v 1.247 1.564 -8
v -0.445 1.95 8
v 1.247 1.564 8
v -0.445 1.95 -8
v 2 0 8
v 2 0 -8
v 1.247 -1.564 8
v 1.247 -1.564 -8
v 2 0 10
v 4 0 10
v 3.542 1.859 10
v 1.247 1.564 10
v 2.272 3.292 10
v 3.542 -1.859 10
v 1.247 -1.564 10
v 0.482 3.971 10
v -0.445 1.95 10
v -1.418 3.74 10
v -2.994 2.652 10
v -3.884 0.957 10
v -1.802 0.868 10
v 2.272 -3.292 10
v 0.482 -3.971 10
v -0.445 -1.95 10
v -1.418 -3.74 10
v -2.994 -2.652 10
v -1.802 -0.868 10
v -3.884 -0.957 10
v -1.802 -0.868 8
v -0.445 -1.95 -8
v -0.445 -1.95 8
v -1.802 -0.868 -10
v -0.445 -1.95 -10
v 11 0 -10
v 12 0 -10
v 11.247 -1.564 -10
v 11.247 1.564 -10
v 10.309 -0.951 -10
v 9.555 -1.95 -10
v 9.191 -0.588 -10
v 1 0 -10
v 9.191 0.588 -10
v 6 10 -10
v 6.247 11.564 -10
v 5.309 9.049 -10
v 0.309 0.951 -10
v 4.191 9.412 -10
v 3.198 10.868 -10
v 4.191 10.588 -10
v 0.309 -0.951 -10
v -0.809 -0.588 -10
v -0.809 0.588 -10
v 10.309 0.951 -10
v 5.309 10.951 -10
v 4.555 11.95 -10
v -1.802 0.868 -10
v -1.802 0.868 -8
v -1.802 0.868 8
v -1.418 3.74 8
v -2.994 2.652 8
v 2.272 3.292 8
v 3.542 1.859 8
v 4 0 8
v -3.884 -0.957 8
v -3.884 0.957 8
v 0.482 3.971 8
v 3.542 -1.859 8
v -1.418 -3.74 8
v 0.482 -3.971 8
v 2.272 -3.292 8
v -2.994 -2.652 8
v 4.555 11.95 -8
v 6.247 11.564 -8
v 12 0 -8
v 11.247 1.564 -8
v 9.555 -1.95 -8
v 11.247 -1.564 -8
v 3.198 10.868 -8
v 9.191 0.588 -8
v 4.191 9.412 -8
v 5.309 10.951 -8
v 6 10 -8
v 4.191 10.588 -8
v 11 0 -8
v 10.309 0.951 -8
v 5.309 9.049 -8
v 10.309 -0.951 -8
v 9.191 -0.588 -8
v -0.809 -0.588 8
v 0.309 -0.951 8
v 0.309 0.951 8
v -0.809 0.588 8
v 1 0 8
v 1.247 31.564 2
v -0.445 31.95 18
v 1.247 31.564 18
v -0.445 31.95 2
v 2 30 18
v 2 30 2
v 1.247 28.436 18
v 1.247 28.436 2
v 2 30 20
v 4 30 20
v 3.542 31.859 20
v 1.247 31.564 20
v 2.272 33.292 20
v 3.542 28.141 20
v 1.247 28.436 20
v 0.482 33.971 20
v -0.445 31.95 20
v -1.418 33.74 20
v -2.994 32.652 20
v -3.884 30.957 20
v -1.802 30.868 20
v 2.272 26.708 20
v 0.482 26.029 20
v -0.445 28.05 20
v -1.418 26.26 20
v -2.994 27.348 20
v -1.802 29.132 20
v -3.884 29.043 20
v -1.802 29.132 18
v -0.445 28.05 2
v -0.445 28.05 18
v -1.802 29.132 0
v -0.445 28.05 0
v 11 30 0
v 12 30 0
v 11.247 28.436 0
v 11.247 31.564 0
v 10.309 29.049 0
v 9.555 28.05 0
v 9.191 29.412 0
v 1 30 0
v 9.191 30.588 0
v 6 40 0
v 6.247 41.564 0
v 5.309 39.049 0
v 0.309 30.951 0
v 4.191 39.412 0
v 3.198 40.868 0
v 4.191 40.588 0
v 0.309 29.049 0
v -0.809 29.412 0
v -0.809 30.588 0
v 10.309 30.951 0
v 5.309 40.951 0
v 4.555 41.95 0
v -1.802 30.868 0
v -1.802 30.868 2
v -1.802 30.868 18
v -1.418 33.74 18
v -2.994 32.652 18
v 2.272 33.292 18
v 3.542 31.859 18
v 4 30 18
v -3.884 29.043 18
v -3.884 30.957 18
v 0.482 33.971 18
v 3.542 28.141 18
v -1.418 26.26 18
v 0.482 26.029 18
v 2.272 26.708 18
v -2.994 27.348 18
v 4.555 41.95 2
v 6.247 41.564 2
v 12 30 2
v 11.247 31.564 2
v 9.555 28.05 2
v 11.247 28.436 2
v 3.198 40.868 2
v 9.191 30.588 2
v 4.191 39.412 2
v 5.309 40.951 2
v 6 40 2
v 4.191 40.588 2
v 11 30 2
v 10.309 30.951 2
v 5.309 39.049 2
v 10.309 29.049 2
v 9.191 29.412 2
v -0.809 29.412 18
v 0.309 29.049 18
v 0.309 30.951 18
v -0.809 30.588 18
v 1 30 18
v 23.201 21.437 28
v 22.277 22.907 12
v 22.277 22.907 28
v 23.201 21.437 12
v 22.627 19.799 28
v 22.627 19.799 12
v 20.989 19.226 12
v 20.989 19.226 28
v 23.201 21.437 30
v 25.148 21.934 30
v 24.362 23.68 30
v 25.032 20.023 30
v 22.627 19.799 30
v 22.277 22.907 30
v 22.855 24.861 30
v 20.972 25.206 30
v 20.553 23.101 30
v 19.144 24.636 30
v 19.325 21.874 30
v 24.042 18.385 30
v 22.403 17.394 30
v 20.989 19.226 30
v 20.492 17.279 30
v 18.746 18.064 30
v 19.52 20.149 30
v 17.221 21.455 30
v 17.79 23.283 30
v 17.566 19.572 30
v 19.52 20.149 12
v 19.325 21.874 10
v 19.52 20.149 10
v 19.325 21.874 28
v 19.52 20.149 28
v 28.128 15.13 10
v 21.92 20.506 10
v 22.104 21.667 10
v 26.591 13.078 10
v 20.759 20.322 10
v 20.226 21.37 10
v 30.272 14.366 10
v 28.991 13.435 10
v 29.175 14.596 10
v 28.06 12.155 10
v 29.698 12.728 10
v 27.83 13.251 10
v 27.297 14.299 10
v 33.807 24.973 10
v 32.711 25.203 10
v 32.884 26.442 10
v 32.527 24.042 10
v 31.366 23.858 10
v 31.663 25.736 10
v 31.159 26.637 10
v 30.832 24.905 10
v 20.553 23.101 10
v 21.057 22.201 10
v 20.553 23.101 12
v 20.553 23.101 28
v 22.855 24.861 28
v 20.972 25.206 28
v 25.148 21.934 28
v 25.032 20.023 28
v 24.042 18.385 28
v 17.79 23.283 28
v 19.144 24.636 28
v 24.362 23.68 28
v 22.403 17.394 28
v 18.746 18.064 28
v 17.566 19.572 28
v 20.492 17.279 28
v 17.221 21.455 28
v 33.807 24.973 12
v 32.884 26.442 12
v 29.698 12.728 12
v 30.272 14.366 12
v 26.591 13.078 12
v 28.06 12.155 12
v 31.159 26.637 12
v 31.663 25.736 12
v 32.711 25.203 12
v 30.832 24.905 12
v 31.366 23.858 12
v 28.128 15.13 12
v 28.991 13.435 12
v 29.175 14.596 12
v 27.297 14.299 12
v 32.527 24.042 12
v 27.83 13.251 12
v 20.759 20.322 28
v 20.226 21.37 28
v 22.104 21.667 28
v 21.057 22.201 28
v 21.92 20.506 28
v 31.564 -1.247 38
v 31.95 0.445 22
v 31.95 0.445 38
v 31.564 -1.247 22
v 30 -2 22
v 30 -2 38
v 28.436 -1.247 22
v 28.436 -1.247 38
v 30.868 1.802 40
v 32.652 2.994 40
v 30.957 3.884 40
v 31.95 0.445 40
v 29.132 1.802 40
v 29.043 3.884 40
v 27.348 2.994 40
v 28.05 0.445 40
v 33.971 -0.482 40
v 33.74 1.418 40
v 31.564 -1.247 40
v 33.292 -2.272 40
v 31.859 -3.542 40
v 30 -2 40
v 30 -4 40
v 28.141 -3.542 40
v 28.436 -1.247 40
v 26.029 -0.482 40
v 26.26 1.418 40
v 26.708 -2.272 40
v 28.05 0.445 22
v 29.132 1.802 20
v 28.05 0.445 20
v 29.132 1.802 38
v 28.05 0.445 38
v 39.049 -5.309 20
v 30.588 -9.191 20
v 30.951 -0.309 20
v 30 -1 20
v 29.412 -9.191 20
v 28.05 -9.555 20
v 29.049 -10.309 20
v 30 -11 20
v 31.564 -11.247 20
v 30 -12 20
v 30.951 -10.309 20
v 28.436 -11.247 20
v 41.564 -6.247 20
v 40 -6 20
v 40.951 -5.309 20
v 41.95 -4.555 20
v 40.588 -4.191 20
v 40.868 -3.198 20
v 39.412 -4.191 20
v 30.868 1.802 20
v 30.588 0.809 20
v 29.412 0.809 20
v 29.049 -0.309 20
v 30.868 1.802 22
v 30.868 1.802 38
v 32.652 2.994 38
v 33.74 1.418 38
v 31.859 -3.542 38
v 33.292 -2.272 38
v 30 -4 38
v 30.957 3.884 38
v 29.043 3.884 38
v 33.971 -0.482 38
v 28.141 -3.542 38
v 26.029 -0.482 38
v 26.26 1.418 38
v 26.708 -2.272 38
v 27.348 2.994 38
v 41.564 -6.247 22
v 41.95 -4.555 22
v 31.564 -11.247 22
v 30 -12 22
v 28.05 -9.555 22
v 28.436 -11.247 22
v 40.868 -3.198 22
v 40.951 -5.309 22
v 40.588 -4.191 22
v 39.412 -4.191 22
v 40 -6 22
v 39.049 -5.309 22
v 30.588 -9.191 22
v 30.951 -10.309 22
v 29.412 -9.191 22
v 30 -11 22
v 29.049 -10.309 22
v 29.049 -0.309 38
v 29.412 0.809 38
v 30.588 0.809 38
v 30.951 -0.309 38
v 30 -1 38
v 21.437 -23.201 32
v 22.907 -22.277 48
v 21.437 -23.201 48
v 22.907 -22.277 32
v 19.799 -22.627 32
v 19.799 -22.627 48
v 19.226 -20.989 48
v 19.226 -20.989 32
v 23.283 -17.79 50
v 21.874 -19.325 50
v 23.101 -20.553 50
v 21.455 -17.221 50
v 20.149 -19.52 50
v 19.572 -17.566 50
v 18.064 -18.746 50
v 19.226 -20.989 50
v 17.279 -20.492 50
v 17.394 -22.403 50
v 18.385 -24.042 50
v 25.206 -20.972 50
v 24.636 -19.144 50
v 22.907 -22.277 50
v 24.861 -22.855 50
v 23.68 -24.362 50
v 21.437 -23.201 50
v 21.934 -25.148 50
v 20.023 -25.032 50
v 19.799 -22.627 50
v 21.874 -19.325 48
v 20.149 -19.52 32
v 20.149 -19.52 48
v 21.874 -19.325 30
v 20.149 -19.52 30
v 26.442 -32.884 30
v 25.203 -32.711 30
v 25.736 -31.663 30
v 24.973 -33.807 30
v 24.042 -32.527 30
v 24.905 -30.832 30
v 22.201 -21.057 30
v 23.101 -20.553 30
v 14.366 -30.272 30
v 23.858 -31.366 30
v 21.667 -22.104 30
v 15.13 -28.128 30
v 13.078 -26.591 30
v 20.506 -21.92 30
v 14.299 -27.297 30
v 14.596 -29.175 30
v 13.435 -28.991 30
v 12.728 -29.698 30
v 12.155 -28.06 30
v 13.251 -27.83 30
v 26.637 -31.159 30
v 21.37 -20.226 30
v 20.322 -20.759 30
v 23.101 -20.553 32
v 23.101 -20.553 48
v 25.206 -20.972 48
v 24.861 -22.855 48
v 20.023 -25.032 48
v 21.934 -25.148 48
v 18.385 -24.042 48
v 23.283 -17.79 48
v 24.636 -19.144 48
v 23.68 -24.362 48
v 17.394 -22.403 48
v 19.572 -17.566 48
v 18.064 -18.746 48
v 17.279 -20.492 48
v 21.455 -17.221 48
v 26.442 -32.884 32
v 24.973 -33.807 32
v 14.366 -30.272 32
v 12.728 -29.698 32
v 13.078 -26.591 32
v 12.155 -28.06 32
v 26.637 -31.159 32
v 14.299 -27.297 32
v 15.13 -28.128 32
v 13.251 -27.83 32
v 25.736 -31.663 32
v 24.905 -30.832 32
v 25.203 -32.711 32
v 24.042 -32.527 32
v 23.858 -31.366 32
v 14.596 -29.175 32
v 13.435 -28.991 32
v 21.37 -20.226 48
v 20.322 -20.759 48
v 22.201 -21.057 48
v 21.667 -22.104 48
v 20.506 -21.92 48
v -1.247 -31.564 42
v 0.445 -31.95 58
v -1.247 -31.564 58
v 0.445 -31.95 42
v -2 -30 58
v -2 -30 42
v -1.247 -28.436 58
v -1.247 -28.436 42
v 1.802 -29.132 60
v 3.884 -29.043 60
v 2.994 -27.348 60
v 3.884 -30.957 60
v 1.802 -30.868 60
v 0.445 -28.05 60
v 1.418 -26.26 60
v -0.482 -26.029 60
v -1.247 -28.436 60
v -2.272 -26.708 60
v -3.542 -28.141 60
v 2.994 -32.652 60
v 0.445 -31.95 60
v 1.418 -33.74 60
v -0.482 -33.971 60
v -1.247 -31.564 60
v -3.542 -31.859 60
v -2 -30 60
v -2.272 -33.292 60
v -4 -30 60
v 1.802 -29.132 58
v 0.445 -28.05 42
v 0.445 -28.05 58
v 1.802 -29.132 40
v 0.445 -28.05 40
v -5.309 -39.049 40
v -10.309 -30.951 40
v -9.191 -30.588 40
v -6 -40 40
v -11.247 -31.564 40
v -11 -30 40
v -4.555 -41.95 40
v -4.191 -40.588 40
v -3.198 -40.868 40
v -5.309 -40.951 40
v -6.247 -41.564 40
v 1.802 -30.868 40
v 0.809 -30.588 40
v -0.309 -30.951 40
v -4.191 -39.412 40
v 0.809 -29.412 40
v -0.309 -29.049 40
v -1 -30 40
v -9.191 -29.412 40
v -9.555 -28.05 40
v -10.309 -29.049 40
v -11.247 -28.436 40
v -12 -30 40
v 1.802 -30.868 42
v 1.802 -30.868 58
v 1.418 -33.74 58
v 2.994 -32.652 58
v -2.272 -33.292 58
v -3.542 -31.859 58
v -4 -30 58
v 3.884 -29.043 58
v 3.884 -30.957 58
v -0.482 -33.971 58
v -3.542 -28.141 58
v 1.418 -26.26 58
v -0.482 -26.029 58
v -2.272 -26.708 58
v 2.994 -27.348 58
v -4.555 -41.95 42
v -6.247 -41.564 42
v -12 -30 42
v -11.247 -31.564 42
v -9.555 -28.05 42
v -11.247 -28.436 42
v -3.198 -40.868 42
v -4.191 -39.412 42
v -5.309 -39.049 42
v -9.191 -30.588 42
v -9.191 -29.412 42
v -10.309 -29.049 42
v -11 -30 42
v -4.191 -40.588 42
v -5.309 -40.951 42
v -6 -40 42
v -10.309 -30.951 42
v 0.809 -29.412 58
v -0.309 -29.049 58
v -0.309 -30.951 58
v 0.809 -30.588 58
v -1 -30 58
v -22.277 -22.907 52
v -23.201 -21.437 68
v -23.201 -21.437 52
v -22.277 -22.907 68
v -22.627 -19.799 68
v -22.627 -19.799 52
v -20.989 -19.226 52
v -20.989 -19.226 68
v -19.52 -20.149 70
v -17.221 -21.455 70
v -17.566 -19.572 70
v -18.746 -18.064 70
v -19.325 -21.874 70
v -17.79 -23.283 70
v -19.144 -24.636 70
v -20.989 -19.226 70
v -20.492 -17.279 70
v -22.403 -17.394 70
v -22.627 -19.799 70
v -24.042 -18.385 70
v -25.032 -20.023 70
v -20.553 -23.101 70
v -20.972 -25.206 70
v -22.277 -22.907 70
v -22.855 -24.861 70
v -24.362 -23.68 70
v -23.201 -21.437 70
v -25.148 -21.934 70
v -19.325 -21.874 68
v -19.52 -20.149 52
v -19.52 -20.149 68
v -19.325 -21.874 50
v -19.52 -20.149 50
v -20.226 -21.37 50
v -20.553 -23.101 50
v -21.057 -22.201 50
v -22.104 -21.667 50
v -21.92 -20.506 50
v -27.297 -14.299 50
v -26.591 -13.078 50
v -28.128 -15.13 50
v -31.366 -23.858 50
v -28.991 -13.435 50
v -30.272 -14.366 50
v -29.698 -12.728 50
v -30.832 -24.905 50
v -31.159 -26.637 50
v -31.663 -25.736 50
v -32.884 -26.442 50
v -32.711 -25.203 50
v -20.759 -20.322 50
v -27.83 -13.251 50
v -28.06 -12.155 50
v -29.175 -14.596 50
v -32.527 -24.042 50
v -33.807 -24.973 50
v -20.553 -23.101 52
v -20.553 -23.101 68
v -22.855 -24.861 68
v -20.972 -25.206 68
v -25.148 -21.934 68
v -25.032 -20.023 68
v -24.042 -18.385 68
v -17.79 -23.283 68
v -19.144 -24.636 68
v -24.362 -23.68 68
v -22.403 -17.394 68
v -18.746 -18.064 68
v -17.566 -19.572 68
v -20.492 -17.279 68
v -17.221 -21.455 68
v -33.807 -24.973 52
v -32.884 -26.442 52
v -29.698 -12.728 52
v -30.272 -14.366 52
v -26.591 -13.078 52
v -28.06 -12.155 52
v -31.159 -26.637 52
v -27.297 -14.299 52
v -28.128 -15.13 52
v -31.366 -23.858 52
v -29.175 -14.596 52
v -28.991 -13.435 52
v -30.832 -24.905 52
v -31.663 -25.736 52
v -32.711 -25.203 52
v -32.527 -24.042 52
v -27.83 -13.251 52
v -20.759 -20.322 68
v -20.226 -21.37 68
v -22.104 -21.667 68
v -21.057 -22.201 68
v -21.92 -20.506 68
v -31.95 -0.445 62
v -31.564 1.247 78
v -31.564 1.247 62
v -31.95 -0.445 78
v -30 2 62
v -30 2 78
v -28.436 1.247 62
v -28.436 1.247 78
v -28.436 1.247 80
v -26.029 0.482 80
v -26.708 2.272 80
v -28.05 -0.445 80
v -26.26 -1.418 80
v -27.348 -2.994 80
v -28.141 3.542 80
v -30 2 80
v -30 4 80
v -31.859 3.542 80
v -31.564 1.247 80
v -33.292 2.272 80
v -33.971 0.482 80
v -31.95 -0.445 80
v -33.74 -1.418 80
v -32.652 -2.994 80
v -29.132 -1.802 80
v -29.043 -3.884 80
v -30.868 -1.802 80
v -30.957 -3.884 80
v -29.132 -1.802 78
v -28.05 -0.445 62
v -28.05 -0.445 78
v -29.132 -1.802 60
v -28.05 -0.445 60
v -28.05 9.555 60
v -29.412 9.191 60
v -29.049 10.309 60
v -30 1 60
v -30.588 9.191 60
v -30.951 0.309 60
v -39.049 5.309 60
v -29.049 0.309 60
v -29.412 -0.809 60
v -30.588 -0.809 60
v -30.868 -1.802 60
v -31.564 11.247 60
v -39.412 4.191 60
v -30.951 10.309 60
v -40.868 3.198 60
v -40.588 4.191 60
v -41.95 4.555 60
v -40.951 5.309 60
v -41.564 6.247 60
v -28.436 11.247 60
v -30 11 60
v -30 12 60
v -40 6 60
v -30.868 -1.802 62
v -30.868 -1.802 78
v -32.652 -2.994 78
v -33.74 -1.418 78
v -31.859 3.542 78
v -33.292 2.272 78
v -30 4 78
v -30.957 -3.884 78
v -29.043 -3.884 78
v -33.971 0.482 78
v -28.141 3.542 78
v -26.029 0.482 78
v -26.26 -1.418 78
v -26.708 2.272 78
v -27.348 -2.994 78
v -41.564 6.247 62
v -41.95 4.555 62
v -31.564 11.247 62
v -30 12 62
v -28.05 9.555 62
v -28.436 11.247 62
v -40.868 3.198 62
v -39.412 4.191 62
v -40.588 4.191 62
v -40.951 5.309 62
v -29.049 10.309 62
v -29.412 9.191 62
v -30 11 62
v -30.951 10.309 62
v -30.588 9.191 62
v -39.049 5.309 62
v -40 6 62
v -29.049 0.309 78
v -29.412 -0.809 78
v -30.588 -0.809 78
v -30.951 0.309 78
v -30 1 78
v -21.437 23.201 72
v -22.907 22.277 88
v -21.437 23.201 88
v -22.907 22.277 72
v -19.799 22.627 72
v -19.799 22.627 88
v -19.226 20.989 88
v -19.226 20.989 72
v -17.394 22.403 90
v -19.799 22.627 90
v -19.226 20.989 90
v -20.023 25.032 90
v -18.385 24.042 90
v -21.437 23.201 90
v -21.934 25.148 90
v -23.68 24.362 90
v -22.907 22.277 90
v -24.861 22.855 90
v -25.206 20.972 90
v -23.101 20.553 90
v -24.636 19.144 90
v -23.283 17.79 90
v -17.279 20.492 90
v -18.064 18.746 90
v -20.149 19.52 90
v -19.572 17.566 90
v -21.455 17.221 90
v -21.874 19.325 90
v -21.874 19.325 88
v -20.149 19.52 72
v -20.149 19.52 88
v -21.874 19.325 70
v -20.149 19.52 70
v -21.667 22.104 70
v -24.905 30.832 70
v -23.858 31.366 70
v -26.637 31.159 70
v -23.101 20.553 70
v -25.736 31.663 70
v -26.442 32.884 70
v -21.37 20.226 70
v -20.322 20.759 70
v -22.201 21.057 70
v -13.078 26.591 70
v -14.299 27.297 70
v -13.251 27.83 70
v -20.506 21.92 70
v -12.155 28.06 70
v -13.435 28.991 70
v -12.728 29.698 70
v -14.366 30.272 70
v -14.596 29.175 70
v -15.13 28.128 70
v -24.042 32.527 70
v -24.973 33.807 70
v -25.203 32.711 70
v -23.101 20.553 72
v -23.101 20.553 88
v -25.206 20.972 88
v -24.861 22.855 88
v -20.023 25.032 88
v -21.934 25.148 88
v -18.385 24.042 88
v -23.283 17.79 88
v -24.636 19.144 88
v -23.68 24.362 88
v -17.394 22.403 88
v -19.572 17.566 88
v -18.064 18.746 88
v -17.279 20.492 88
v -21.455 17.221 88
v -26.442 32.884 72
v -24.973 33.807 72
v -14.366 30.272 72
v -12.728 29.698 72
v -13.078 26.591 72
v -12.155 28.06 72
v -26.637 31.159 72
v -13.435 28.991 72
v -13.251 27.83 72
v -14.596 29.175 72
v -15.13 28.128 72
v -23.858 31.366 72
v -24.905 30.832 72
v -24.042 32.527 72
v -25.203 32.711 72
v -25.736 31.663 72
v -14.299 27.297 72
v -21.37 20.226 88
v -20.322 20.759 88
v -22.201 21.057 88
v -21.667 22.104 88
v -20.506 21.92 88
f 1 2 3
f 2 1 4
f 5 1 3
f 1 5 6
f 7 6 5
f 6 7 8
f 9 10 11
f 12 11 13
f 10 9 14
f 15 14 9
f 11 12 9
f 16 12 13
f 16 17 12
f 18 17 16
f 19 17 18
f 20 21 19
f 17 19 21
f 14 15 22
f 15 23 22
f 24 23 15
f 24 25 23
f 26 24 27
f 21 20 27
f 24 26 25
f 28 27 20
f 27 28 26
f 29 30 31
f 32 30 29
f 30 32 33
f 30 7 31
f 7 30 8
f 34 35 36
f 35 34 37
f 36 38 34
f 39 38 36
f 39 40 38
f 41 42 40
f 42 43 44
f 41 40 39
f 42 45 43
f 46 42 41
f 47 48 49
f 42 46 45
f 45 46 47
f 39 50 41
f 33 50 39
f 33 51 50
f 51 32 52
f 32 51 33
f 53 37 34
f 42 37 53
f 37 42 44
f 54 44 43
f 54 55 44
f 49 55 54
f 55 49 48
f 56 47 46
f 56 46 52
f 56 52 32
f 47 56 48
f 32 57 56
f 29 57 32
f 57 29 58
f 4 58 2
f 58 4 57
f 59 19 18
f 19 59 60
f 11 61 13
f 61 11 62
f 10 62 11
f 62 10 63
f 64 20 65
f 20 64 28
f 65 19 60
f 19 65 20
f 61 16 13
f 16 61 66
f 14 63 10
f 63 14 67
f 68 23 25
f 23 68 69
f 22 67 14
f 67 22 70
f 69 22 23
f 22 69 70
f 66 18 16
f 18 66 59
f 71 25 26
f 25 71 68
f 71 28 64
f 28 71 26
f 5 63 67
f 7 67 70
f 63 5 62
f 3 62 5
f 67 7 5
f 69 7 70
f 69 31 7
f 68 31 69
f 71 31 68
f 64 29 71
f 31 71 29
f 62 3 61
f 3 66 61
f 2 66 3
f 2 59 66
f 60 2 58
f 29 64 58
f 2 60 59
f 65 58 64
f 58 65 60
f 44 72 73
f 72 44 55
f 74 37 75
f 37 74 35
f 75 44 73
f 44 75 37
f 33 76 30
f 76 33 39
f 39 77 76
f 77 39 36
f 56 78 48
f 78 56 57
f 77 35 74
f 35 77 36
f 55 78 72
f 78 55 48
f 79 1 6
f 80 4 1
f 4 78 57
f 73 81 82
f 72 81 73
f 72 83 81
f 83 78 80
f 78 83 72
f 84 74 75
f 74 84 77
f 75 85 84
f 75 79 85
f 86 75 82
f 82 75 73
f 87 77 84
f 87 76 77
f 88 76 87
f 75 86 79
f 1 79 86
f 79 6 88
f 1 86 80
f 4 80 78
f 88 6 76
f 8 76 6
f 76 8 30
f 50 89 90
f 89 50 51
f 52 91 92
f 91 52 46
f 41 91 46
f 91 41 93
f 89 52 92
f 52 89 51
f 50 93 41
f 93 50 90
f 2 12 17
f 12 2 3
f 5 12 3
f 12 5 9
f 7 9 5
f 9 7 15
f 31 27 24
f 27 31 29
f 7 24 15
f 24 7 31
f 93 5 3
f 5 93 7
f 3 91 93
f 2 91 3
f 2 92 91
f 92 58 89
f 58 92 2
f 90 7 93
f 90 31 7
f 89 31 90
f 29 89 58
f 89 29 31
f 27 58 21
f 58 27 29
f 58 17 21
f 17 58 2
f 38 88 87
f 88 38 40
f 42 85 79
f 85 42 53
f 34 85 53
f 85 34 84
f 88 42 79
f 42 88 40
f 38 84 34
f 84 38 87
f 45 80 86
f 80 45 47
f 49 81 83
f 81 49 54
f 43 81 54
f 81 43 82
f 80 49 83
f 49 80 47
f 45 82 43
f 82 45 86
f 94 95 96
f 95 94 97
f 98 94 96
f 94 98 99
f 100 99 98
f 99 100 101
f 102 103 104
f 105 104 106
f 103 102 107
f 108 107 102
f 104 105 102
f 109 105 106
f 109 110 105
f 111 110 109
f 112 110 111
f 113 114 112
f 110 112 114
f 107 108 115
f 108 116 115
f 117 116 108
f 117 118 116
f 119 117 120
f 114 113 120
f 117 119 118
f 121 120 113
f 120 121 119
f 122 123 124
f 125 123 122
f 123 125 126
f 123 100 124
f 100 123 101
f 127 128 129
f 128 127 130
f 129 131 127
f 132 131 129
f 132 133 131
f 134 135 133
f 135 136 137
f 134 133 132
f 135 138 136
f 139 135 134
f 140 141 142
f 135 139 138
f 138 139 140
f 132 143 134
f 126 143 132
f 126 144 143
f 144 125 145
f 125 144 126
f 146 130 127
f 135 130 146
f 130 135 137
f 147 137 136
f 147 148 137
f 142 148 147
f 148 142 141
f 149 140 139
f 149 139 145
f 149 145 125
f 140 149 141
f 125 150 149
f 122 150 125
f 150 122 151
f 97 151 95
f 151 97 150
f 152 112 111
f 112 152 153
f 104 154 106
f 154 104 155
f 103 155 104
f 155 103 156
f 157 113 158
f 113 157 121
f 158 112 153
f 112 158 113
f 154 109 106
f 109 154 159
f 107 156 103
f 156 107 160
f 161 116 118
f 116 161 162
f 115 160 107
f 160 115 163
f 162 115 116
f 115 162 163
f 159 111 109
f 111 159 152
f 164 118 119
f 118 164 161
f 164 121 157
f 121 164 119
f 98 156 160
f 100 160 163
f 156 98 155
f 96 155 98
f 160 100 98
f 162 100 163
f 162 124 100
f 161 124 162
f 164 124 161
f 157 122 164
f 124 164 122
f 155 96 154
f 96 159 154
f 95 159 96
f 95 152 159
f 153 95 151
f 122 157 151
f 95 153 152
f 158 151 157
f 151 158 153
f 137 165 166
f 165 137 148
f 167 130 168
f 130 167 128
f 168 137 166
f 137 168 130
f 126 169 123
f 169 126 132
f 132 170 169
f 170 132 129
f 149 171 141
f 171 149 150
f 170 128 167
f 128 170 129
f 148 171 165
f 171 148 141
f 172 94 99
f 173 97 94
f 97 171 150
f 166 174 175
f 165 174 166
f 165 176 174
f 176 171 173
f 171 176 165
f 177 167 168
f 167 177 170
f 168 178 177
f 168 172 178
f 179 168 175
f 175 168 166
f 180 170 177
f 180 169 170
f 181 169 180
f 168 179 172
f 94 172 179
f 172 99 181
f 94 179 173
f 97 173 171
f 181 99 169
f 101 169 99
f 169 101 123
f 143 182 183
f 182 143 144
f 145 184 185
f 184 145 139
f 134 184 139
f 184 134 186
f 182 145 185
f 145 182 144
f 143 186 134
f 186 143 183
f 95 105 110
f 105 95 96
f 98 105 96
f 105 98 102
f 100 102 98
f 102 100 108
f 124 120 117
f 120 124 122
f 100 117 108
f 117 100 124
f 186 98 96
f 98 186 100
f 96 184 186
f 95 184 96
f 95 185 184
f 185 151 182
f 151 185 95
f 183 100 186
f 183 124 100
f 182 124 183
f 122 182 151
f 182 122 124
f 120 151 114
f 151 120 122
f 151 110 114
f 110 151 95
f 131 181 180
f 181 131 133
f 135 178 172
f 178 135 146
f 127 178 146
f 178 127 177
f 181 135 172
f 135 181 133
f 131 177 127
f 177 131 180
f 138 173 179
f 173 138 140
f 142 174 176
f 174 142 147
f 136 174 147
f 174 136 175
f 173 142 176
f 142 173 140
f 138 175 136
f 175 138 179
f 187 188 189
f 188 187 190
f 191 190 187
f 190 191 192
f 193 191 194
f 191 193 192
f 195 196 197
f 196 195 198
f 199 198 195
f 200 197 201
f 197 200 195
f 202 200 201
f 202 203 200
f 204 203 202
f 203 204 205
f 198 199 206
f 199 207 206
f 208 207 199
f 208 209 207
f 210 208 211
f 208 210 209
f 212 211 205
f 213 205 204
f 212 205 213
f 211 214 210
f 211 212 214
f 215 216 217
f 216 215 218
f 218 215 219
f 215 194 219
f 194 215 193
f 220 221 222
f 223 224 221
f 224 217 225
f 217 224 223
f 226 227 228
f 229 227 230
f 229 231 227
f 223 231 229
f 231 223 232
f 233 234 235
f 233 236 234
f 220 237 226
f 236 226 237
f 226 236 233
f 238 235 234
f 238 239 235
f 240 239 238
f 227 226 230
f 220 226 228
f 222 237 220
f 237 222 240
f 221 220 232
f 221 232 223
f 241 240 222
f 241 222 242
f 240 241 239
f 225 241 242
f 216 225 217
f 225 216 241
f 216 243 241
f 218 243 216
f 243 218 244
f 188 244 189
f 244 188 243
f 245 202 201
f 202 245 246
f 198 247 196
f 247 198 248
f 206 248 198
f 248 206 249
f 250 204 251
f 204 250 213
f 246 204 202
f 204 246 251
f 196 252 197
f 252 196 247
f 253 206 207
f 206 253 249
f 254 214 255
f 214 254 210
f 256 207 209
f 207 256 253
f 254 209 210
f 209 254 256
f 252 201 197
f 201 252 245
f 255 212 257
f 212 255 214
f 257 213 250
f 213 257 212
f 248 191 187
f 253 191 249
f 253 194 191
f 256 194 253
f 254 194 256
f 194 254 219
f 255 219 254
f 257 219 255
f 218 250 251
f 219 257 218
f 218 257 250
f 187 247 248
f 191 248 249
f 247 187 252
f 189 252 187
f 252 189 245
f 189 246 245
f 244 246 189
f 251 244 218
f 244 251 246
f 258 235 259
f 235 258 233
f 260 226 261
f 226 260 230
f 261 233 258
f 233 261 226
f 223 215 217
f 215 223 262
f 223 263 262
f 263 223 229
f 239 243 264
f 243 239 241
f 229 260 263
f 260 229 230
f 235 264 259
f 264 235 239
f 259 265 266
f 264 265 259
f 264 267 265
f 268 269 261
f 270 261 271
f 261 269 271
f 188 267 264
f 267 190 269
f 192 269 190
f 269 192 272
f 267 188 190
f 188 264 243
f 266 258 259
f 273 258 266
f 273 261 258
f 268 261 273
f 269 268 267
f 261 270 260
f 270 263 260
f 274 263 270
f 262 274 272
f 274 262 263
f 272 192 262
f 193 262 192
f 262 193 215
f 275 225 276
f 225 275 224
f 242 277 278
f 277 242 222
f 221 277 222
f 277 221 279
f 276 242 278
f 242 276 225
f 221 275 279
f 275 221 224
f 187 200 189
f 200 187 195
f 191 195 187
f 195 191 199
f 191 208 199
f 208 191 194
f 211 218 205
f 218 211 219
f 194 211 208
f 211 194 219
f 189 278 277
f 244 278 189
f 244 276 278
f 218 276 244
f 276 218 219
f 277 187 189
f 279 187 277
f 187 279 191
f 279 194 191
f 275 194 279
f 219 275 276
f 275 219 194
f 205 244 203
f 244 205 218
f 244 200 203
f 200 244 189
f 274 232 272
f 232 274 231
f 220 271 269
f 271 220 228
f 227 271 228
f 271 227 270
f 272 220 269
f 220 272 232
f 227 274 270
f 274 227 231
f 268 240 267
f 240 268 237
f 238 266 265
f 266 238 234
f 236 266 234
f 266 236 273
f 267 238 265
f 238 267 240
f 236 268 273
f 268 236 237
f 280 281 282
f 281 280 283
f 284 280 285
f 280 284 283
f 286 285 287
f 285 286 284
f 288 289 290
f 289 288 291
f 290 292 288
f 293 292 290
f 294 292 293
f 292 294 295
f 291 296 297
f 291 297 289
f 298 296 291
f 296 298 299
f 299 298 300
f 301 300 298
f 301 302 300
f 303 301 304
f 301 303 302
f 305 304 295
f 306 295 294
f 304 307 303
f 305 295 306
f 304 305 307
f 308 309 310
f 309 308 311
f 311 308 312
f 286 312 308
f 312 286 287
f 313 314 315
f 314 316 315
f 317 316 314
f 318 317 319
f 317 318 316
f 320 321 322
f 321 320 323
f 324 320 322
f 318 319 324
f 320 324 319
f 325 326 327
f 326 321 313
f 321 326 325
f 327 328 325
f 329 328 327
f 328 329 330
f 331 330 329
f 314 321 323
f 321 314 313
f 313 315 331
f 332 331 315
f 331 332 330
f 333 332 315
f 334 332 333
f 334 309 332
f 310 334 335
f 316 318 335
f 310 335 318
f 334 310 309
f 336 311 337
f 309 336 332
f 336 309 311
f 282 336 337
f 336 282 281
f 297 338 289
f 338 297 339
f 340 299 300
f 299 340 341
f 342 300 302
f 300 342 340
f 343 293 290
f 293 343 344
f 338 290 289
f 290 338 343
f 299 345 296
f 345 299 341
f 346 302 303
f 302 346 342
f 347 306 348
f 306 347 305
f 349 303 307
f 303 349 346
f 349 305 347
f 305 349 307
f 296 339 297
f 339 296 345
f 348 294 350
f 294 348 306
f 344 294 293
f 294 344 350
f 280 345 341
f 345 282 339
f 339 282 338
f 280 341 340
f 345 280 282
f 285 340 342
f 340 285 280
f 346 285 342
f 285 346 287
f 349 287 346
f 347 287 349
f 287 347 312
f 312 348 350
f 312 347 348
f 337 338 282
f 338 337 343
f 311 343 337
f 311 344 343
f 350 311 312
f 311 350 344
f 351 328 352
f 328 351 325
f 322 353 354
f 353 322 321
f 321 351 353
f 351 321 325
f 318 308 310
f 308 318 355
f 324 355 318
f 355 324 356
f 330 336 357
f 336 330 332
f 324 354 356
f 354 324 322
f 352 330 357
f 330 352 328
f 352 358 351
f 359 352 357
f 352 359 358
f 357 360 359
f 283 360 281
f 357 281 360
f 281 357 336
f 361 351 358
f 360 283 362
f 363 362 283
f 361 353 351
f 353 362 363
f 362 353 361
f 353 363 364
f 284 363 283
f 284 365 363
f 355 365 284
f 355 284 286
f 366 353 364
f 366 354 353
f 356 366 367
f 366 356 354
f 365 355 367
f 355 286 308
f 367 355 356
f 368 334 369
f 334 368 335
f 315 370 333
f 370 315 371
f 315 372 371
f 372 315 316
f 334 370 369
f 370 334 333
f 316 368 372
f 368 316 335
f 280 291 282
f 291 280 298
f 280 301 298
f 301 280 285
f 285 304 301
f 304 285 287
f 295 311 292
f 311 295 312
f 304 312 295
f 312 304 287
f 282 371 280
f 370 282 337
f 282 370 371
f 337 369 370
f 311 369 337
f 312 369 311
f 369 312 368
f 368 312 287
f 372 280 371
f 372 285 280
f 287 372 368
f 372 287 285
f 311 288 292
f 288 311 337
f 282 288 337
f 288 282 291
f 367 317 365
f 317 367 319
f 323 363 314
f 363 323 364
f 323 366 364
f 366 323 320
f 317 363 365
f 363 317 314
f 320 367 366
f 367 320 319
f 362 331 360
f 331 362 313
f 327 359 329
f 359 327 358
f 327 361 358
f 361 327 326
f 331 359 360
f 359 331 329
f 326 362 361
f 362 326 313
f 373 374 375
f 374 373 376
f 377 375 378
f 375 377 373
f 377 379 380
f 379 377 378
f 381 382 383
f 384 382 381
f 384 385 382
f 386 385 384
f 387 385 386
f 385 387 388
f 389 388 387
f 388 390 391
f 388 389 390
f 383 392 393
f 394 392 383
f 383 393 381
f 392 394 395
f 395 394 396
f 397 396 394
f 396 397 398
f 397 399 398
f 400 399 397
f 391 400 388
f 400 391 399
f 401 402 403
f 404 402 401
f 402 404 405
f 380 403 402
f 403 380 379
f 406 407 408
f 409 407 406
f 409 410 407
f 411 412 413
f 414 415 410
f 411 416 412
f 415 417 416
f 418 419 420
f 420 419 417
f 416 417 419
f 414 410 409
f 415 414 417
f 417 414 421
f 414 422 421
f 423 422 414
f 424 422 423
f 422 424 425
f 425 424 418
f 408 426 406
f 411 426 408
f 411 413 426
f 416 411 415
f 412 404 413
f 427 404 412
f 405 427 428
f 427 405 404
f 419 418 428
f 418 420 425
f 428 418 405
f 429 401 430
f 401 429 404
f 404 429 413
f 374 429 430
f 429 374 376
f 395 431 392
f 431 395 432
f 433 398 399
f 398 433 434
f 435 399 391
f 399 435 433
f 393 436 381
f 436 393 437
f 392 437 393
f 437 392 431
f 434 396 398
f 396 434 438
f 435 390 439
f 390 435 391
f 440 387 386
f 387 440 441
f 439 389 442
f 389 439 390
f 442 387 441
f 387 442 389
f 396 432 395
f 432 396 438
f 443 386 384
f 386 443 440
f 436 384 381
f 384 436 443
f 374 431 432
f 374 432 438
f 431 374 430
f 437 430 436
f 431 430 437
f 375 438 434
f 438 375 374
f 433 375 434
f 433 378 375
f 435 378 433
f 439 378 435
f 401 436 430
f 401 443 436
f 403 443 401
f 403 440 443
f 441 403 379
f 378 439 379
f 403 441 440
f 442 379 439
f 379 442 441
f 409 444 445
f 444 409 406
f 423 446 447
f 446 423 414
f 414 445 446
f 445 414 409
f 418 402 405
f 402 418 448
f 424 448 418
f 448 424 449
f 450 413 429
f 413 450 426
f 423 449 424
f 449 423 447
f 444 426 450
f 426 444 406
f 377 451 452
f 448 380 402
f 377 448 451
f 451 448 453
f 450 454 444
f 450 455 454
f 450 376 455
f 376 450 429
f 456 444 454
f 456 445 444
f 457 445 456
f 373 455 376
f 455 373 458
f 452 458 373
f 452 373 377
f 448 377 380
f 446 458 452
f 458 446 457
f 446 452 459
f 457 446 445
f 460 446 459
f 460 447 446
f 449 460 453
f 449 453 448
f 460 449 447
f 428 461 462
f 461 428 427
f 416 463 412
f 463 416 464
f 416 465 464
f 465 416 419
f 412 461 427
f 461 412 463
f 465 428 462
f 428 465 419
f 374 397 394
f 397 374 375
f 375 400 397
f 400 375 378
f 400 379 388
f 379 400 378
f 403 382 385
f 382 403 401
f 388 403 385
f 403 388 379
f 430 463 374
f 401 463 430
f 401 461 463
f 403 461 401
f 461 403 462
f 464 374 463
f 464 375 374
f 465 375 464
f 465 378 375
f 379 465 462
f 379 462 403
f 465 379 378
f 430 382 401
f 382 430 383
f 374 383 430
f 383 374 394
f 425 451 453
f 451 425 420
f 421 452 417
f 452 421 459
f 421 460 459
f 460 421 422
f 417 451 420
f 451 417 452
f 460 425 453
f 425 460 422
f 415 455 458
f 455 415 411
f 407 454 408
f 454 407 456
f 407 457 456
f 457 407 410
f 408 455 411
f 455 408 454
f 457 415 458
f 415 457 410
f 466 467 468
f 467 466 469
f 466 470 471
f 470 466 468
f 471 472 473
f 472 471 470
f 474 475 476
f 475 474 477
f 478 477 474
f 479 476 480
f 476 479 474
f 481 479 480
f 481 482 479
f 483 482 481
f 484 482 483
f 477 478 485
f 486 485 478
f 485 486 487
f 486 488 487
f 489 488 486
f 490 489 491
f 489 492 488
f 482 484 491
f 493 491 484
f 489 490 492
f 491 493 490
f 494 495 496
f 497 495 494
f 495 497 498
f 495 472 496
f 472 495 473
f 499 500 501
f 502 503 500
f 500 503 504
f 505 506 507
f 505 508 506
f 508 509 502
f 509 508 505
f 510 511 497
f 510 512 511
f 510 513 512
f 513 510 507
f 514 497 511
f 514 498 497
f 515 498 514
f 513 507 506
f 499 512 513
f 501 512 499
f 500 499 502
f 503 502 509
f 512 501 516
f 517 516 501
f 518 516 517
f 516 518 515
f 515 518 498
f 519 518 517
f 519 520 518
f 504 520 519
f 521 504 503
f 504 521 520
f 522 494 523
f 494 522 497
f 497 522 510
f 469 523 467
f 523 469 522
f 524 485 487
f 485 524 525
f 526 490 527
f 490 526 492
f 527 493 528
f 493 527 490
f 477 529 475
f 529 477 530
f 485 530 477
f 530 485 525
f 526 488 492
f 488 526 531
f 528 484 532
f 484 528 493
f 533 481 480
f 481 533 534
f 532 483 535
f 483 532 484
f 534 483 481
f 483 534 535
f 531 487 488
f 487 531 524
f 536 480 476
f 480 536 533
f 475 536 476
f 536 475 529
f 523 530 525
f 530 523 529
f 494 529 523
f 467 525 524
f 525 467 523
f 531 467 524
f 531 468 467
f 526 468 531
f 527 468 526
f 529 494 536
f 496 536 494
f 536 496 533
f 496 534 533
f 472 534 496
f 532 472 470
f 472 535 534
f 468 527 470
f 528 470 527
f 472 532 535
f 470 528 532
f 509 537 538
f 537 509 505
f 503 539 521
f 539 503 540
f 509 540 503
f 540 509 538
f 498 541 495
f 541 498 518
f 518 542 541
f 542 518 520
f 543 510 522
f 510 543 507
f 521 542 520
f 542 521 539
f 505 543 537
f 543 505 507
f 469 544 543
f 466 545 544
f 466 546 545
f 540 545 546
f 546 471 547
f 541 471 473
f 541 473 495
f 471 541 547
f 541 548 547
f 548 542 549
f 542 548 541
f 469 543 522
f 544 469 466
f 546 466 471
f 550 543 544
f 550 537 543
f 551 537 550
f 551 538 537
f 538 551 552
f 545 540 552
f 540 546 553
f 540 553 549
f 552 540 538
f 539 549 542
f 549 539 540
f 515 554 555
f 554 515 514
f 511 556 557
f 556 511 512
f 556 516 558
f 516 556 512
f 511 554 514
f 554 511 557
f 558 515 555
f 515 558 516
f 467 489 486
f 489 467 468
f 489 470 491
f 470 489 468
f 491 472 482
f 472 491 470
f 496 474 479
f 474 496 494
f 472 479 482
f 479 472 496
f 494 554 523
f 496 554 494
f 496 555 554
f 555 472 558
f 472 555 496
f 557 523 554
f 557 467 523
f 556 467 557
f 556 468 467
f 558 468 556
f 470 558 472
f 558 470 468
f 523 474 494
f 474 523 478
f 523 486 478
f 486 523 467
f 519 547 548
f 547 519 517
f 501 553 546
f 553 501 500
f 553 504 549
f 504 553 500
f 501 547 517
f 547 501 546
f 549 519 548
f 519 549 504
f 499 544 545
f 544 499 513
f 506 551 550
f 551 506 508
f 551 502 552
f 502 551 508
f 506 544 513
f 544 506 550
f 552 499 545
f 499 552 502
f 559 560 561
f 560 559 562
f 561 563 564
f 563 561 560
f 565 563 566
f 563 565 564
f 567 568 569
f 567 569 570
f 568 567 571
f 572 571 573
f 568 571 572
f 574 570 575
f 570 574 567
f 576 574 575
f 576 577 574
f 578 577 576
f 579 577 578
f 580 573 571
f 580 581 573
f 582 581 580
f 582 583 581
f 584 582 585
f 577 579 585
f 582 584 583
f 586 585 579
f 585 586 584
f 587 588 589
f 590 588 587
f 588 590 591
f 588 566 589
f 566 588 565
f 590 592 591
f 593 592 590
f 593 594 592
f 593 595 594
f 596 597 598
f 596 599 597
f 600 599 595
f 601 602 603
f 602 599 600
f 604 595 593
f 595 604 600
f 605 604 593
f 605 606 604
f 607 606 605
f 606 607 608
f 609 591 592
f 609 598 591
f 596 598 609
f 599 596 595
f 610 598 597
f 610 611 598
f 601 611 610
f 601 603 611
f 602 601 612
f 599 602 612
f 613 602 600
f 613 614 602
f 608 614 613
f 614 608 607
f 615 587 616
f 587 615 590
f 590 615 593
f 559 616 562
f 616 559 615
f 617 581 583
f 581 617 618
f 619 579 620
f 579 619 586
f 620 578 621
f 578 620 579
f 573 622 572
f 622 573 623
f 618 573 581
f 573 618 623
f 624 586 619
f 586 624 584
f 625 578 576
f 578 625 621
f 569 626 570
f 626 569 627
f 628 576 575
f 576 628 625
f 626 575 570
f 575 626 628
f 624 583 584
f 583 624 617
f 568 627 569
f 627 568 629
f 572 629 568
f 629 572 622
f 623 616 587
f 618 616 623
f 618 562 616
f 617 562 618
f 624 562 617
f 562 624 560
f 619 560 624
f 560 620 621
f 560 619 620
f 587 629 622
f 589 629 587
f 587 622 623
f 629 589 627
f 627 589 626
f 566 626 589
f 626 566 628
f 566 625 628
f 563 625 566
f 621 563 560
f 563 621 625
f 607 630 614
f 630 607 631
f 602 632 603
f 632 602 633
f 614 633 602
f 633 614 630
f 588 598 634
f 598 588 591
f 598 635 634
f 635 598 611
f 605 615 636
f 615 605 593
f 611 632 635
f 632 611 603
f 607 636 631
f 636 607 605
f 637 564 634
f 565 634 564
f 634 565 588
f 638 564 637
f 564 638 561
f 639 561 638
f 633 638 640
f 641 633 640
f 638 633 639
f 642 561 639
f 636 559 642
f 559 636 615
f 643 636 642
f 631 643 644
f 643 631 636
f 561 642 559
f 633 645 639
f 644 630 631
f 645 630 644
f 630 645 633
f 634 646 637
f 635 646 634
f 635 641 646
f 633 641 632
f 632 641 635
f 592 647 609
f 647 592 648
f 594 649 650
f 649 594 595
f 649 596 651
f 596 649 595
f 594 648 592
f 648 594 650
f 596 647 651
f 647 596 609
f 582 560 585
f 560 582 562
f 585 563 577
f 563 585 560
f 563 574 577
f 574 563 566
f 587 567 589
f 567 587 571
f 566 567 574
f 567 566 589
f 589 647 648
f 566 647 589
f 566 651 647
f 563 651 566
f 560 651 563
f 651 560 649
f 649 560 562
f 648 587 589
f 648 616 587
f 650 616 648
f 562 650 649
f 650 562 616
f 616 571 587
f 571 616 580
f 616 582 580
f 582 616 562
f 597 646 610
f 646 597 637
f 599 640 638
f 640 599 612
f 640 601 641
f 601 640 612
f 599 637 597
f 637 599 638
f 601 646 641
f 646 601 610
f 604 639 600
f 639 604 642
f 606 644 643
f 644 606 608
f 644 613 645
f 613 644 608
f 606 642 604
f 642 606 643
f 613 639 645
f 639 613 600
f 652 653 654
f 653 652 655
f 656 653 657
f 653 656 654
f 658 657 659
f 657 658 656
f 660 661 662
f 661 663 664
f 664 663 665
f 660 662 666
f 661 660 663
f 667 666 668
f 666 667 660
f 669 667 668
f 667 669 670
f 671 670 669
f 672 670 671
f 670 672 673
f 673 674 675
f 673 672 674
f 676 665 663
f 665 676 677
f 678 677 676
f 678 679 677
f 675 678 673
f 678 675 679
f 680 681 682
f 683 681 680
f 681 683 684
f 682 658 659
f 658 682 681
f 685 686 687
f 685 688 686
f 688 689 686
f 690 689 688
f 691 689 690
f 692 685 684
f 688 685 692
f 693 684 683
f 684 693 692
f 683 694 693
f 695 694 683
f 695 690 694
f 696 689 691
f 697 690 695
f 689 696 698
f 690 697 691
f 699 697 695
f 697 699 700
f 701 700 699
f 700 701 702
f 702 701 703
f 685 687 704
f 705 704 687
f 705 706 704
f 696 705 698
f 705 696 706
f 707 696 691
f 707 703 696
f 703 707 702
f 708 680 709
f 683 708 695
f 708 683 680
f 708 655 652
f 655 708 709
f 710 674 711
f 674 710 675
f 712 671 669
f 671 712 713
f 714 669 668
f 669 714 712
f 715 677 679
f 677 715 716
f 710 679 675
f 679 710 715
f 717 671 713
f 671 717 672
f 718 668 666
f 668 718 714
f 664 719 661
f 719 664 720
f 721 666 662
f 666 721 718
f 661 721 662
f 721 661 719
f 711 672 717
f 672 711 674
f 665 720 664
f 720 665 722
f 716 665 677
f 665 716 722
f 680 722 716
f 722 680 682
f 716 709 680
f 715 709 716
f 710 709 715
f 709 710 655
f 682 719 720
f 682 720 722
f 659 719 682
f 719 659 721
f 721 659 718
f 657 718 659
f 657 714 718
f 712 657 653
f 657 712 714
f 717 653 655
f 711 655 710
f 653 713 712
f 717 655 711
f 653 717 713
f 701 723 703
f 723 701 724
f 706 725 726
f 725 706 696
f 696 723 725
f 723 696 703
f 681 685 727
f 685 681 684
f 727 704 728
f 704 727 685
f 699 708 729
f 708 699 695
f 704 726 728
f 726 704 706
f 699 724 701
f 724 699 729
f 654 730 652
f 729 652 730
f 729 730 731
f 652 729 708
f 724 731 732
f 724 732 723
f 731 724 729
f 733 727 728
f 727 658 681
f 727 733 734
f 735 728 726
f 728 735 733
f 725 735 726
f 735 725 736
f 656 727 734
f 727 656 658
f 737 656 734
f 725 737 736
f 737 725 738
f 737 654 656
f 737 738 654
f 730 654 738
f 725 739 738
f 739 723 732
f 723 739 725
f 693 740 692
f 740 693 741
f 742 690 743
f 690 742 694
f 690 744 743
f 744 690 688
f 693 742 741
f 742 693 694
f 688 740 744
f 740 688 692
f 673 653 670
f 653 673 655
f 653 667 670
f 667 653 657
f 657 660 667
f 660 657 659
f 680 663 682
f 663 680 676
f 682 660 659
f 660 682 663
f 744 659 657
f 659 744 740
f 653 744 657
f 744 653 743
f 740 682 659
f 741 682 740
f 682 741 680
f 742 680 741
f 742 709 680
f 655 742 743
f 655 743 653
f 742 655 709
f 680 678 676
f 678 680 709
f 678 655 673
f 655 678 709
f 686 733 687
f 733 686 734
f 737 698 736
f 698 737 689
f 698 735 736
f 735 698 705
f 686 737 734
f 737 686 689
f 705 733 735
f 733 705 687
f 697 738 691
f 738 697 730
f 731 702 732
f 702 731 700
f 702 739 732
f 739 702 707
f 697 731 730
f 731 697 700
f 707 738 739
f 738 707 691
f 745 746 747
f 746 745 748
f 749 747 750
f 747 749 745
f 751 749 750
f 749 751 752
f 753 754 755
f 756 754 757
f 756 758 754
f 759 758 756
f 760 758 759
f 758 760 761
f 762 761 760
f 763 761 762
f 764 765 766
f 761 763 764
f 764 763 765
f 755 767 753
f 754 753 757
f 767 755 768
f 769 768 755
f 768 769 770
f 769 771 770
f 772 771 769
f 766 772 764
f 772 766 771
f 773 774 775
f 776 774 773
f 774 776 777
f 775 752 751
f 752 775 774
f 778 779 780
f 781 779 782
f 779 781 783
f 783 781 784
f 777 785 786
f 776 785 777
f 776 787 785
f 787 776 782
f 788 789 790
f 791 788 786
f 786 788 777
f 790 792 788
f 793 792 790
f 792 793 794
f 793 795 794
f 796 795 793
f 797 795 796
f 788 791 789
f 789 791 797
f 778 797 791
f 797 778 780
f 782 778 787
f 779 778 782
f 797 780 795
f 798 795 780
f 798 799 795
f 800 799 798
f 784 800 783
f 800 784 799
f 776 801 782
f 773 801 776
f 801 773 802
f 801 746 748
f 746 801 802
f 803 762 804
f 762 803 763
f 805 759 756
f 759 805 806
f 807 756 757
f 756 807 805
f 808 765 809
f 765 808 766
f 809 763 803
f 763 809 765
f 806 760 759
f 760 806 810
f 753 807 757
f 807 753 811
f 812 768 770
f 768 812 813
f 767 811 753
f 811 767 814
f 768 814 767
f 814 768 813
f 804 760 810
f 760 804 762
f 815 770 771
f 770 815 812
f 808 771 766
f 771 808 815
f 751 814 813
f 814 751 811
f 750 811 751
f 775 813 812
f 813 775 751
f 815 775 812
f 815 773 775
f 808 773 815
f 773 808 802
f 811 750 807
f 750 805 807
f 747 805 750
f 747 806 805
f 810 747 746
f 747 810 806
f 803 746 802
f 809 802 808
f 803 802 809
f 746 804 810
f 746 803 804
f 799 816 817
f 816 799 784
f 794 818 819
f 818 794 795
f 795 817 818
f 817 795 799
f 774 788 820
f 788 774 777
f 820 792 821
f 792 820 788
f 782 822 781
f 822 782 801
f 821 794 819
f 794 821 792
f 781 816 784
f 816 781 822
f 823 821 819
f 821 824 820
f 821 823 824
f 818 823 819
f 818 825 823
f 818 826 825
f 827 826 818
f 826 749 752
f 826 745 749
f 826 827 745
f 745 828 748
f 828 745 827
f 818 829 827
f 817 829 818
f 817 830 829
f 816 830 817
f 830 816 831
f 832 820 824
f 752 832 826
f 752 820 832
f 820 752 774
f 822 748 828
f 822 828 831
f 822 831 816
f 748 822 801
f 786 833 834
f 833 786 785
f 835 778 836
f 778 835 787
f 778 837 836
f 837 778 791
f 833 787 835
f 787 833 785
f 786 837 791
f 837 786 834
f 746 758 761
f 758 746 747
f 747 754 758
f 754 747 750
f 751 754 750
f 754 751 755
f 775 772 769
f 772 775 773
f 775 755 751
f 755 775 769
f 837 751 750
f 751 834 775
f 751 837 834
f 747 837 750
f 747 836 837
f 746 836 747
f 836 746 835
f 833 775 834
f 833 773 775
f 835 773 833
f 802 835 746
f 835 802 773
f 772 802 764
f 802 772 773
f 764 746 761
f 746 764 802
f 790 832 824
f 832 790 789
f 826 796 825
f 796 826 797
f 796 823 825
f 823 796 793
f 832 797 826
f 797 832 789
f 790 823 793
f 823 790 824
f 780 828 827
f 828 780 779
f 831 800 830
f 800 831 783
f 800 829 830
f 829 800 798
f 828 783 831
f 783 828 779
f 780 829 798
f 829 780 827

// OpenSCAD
/*

Sage Ridge Robotics OpenSCAD file.
Christopher von Nagy, July 2014.

Example 06 modules. 

*/

// Modules
// OpenSCAD allows us to define modules. The module()
// command creates named objects that can be used elsewhere
// in your design code. While it is entirely up to you where
// you place module() definitions, I like to put them toward
// the end of a project. In a more complex project, modules()
// can be placed in separate files and "included" into
// the main project file.

// Look at the bottom of this file for the definition
// of the object used here, a complex widget.
translate([0,0,0]) acme_widget_22();

// Here's an example of the acme_widget_22() module
// used in a programatic construct. First, the location
// of the group is set to (0, -100, 10) and then the
// group is constructed.

// The sine of the angle, i * 45, is used
// to calculate x, and the cosine, y. Multiplying a 
// constant, 10, by i increases z with each step.

hypothenuse = 30;
step_angle = 45;
translate([0,0,10]) 
   for (i = [0 : 7])
   {

      translate([
         (sin(i * step_angle) * hypothenuse),
         (cos(i * step_angle) * hypothenuse), 
         (i * 10)
      ])
      rotate(i*-45,0,0)
      acme_widget_22();

   };

/*

Define modules

We define larger modules used in code examples above in this section.

These modules include the

   acme_widget22() module
   match_box() module
   box_of_many_sizes()


*/


// The acme_widget_22() module
module acme_widget_22() {
   i = -10;
   difference() {

      union(){
         cylinder(r=2, h=20, center=true);
         translate([0,0,8]) cylinder(r=4,h=2);
         hull () {
            translate([0,0,i]) cylinder(r=2,h=2);
            translate([10,0,i]) cylinder(r=2,h=2);
            translate([5,10,i]) cylinder(r=2,h=2);
         }
      }

      # cylinder(r=1, h=22, center=true);
      # translate([0,0,8]) cylinder(r=2, h=2);
      # translate([10,0,i-1]) cylinder(r=1,h=4);
      # translate([5,10,i-1]) cylinder(r=1,h=4);

   }
}


// The match_box module
module match_box() {
   difference(){
      cube([40,20,10], center=true);
      translate([0,0,1]) cube([38,18,10], center=true);
   }
   translate([-60,100,15]) 
   union(){
      cube([40,20,2], center=true);
      translate(0,0,0) cube([38,18,4], center=true);
   }
}


// The box_of_many_sizes() module
module box_of_many_sizes(

   // sensible default values
   width = 60,
   length = 100,
   height = 40,

)
{

   wall_thickness = 2;

   translate([0,0,height/2])
   difference(){
      cube([width,length,height], center=true);
      translate([0,0,4]) cube([
         width-(2 * wall_thickness),
         length-(2 * wall_thickness),
         height-(2 * wall_thickness)], 
         center=true);

   } 
}

   
/*

License code:

Creative Commons Atribution 4.0

Attribution — You must give appropriate credit, provide a link to the license, and indicate if changes were made. You may do so in any reasonable manner, but not in any way that suggests the licensor endorses you or your use.

No additional restrictions — You may not apply legal terms or technological measures that legally restrict others from doing anything the license permits.


*/
